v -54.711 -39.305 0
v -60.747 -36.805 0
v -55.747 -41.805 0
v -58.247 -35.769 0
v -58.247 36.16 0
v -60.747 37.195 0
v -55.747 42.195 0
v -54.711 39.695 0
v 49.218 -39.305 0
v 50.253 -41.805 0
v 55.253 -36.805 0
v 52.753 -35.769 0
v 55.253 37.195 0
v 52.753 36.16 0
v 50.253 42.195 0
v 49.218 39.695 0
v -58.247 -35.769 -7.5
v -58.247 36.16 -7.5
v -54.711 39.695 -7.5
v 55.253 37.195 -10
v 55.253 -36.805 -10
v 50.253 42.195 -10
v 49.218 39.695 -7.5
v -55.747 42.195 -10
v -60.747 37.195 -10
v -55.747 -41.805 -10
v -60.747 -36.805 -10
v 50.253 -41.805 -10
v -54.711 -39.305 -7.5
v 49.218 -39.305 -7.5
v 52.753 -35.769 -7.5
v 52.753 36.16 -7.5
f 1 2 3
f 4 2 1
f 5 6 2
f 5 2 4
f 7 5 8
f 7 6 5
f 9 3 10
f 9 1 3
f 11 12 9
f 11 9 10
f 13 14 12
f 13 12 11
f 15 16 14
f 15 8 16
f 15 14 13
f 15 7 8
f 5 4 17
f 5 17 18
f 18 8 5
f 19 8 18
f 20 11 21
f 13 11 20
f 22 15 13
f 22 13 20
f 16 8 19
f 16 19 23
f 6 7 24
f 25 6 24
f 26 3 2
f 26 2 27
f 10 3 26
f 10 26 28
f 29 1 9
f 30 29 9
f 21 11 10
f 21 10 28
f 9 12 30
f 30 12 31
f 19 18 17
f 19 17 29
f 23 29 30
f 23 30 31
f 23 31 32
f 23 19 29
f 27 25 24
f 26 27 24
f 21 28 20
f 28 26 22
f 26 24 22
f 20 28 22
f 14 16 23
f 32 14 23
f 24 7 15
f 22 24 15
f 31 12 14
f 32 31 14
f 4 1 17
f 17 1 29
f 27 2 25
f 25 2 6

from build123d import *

# Parameters (mm, degrees)
F0_W     = 116
F0_H     = 84
F1_DEPTH = 10
F2_SIZE  = 5
F3_T     = -2.5


with BuildPart() as f1:
    # F0 (on Top) → F1 (new body)
    with BuildSketch(Plane.XY):
        with Locations((-2.746954, 0.195384)):
            Rectangle(F0_W, F0_H)
    extrude(amount=-F1_DEPTH)

    # F2
    f2_edges = [f1.edges().sort_by_distance(p)[0] for p in [
        (55.253046, -41.804616, -5),
        (-60.746954, -41.804616, -5),
        (55.253046, 42.195384, -5),
        (-60.746954, 42.195384, -5),
    ]]
    chamfer(f2_edges, length=F2_SIZE)

    # F3
    f3_openings = [f1.faces().sort_by_distance(p)[0] for p in [
        (-2.746954, 0.195384, 0),
    ]]
    offset(amount=F3_T, openings=f3_openings)


solid = f1.part
